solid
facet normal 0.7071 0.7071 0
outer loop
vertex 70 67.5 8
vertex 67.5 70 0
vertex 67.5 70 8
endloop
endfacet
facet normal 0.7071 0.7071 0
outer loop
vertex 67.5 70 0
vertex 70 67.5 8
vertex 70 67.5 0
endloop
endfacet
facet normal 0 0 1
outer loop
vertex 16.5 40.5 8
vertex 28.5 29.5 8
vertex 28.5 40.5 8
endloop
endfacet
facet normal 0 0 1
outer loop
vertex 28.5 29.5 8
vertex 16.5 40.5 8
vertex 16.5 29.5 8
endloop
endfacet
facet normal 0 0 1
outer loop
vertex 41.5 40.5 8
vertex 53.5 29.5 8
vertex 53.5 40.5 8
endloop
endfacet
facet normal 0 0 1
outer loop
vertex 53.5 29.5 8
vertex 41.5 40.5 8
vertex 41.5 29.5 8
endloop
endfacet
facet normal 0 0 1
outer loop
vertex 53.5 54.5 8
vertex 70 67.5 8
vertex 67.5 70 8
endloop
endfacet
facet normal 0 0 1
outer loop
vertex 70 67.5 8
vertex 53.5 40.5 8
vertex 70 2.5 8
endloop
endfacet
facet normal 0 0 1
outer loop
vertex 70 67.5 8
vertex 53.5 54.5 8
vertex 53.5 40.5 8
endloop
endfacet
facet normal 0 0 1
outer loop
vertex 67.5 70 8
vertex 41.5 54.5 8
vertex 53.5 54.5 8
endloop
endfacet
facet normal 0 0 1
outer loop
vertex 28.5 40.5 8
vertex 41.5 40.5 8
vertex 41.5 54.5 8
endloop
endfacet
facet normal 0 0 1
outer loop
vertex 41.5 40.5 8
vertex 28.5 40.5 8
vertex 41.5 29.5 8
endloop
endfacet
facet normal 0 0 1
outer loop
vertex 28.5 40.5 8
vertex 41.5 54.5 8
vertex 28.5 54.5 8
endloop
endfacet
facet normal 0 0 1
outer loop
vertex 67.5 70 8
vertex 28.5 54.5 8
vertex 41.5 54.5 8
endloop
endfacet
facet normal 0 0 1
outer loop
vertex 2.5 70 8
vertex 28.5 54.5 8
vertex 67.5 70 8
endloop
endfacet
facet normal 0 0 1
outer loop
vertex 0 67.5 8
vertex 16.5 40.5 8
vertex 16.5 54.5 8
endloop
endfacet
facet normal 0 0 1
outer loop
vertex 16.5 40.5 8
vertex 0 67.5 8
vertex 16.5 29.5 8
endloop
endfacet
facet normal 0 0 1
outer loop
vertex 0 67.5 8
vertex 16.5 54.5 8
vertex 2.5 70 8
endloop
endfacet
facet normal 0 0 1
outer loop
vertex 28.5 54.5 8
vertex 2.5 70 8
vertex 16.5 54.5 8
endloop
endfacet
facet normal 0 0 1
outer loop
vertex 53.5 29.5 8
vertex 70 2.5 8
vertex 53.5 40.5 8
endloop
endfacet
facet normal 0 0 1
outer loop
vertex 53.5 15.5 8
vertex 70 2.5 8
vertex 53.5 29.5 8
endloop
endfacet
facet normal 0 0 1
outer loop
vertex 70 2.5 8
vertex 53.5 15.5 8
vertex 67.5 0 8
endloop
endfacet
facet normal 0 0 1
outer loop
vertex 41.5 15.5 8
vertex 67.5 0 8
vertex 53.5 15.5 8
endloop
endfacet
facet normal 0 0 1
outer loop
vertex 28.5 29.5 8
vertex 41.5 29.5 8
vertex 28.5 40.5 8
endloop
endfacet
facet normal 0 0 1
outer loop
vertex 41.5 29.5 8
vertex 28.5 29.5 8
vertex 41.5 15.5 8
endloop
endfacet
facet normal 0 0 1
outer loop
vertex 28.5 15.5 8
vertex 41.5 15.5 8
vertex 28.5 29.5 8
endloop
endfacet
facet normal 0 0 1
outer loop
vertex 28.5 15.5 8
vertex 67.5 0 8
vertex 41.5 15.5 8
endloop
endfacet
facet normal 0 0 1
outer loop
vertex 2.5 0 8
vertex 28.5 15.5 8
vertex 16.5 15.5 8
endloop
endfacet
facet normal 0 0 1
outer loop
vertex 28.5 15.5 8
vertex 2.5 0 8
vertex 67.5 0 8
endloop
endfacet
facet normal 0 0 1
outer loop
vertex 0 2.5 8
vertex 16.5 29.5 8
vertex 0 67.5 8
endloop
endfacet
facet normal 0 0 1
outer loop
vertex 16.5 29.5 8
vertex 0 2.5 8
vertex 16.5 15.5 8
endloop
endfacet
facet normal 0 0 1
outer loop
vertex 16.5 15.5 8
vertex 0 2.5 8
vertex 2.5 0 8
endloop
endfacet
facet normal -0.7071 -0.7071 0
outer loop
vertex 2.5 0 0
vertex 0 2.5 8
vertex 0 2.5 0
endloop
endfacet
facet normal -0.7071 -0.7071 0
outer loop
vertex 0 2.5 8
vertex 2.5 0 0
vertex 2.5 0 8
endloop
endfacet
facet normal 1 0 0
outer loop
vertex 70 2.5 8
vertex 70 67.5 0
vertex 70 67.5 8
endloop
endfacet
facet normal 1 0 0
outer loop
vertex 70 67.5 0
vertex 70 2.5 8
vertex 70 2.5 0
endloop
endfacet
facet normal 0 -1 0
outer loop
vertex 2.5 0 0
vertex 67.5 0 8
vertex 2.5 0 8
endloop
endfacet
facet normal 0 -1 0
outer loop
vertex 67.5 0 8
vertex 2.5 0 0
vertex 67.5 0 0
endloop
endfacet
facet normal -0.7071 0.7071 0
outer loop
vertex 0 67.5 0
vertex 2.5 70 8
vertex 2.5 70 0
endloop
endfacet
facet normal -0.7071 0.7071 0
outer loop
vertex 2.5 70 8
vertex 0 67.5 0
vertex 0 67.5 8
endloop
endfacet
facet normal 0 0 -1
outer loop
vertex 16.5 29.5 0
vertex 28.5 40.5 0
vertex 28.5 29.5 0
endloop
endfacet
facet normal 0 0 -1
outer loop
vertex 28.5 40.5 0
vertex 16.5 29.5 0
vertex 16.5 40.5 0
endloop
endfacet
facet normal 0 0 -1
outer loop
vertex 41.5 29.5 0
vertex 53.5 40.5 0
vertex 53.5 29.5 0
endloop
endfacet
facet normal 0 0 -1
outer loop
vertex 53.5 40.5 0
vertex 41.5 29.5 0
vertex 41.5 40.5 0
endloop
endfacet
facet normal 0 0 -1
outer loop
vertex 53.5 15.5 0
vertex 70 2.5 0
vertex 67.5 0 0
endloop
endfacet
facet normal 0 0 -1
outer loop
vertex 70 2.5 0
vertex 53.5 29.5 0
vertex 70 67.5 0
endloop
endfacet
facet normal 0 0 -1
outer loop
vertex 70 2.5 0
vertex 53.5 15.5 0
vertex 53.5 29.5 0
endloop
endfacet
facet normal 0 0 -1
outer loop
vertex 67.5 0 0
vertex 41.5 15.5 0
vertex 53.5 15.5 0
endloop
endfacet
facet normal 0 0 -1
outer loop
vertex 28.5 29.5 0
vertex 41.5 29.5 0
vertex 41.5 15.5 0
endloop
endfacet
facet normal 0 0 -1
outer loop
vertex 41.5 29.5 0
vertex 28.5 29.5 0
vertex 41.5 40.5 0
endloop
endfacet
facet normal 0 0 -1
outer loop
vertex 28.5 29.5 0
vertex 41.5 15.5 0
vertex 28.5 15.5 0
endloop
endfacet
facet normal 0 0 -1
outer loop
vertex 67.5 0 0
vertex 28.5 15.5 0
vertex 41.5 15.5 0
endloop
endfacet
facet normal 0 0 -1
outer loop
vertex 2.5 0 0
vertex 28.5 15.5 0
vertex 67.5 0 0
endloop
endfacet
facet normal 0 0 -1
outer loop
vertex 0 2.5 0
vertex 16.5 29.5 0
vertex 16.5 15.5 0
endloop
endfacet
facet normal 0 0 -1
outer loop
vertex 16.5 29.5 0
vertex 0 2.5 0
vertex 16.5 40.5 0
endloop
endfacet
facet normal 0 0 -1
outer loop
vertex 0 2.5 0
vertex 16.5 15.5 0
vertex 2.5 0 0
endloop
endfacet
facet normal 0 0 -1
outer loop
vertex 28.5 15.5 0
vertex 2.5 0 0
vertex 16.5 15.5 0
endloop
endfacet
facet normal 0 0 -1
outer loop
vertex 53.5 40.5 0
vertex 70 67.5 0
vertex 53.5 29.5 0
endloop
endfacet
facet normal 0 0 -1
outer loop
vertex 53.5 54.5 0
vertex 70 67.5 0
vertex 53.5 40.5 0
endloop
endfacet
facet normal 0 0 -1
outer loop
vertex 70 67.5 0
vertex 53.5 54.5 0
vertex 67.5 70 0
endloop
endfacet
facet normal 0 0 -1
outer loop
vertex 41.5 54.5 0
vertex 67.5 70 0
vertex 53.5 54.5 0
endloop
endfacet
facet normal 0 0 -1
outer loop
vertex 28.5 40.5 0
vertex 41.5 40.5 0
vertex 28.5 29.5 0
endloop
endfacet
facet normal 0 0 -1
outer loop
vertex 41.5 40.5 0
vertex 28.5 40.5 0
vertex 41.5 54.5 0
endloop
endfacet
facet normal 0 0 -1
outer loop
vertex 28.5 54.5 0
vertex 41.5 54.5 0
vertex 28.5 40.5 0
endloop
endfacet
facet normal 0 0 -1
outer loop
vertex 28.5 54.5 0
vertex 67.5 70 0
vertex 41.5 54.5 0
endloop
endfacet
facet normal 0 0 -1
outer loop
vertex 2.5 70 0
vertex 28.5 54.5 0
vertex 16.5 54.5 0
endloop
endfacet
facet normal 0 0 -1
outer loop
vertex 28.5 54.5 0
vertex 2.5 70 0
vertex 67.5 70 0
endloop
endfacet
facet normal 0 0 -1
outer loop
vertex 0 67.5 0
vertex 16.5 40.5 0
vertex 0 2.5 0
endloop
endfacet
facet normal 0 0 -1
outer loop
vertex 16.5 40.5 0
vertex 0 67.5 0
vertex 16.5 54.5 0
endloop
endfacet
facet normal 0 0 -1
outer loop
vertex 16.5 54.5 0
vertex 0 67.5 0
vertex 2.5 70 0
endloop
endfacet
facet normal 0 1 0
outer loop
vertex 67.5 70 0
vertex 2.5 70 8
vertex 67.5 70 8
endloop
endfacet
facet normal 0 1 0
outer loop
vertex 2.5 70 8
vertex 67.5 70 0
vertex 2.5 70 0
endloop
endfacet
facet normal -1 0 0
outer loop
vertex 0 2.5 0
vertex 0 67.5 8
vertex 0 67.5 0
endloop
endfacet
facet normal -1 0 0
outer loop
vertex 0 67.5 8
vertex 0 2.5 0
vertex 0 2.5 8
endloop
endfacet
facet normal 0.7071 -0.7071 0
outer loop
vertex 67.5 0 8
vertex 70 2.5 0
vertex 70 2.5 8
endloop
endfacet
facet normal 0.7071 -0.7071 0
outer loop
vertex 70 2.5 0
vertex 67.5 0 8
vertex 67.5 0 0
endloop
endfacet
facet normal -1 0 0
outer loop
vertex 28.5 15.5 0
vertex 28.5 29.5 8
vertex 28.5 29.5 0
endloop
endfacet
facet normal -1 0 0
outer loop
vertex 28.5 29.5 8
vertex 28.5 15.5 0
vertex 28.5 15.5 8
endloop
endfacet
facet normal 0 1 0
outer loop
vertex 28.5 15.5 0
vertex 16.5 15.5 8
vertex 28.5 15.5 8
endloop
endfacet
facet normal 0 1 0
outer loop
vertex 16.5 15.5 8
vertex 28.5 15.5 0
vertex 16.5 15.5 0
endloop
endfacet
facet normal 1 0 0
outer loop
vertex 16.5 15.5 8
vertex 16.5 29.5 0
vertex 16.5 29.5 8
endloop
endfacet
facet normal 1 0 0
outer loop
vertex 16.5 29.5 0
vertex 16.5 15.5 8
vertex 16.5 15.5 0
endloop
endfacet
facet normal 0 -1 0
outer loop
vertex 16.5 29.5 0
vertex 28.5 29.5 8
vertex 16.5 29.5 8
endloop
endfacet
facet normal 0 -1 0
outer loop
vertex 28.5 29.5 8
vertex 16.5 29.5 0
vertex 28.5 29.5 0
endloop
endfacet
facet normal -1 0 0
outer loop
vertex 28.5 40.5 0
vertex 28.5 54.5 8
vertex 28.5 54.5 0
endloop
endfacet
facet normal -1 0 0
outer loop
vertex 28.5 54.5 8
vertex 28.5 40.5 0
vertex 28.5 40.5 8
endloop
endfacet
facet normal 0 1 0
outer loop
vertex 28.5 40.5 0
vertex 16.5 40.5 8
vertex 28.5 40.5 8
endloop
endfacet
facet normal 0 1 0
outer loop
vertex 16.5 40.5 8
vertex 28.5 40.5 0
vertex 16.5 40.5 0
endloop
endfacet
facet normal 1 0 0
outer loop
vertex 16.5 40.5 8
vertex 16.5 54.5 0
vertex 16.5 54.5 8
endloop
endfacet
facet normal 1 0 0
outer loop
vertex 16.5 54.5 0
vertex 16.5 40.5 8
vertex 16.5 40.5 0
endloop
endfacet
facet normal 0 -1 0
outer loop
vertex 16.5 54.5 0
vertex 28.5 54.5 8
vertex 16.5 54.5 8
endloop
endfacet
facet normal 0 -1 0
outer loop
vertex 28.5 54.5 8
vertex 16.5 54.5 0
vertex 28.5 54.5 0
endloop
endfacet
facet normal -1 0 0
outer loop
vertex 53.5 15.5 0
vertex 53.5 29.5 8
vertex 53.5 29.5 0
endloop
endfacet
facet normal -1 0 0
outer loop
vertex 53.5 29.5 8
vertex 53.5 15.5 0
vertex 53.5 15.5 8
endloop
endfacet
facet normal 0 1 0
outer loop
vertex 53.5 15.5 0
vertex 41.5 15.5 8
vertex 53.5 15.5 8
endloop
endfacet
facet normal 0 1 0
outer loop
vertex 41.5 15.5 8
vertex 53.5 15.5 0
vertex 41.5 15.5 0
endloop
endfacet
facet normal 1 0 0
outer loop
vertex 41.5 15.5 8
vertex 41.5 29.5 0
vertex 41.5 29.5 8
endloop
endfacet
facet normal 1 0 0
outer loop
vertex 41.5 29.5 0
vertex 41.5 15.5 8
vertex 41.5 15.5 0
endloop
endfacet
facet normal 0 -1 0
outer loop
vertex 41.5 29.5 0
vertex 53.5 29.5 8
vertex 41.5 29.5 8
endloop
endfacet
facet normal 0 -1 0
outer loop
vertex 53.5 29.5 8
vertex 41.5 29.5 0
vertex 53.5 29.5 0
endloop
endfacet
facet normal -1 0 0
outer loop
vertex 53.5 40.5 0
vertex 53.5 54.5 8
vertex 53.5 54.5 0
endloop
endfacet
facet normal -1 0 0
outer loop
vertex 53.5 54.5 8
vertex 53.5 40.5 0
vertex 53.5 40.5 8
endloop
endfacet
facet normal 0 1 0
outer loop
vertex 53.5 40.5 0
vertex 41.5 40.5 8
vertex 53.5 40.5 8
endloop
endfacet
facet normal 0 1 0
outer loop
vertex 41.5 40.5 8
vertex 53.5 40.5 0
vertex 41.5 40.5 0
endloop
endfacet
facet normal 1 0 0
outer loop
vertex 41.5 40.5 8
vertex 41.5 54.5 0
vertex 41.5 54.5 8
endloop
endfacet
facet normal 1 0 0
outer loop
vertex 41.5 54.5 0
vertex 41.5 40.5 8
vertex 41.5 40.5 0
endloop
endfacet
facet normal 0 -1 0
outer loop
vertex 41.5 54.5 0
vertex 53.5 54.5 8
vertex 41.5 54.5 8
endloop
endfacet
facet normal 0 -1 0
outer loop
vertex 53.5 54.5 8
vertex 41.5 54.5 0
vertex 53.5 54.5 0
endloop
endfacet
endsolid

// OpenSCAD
$fn = 32;

// ----------------------------------------------------------------------
// Windowed plate: 4 voids, 70 x 70 x 8 mm
// ----------------------------------------------------------------------

// --- parameters (mm) ---
plate_l = 70;             // plate length, X
plate_w = 70;             // plate width, Y
plate_t = 8;              // plate thickness, Z
edge_margin = 10;         // wall from the plate edge to any window
win_l = 12;               // pocket length
win_w = 14;               // pocket width
pitch_x = 25;             // grid pitch along X
pitch_y = 25;             // grid pitch along Y
depth_1 = 8;              // depth of void 1 (full thickness = through)
depth_2 = 8;              // depth of void 2 (full thickness = through)
depth_3 = 8;              // depth of void 3 (full thickness = through)
depth_4 = 8;              // depth of void 4 (full thickness = through)
corner_c = 2.5;           // corner chamfer of the plate

profile = [[2.5, 0], [67.5, 0], [70, 2.5], [70, 67.5], [67.5, 70], [2.5, 70], [0, 67.5], [0, 2.5]];  // primary outline, 8 points, counter clockwise
void_1 = [[16.5, 15.5], [28.5, 15.5], [28.5, 29.5], [16.5, 29.5]];  // pocket at grid node 0,0, 4 points
void_2 = [[16.5, 40.5], [28.5, 40.5], [28.5, 54.5], [16.5, 54.5]];  // pocket at grid node 0,1, 4 points
void_3 = [[41.5, 15.5], [53.5, 15.5], [53.5, 29.5], [41.5, 29.5]];  // pocket at grid node 1,0, 4 points
void_4 = [[41.5, 40.5], [53.5, 40.5], [53.5, 54.5], [41.5, 54.5]];  // pocket at grid node 1,1, 4 points

// --- the one profile operation ---
difference() {
  linear_extrude(height = plate_t) polygon(points = profile);
  translate([0, 0, -1])
    linear_extrude(height = plate_t + 2) polygon(points = void_1);
  translate([0, 0, -1])
    linear_extrude(height = plate_t + 2) polygon(points = void_2);
  translate([0, 0, -1])
    linear_extrude(height = plate_t + 2) polygon(points = void_3);
  translate([0, 0, -1])
    linear_extrude(height = plate_t + 2) polygon(points = void_4);
}
